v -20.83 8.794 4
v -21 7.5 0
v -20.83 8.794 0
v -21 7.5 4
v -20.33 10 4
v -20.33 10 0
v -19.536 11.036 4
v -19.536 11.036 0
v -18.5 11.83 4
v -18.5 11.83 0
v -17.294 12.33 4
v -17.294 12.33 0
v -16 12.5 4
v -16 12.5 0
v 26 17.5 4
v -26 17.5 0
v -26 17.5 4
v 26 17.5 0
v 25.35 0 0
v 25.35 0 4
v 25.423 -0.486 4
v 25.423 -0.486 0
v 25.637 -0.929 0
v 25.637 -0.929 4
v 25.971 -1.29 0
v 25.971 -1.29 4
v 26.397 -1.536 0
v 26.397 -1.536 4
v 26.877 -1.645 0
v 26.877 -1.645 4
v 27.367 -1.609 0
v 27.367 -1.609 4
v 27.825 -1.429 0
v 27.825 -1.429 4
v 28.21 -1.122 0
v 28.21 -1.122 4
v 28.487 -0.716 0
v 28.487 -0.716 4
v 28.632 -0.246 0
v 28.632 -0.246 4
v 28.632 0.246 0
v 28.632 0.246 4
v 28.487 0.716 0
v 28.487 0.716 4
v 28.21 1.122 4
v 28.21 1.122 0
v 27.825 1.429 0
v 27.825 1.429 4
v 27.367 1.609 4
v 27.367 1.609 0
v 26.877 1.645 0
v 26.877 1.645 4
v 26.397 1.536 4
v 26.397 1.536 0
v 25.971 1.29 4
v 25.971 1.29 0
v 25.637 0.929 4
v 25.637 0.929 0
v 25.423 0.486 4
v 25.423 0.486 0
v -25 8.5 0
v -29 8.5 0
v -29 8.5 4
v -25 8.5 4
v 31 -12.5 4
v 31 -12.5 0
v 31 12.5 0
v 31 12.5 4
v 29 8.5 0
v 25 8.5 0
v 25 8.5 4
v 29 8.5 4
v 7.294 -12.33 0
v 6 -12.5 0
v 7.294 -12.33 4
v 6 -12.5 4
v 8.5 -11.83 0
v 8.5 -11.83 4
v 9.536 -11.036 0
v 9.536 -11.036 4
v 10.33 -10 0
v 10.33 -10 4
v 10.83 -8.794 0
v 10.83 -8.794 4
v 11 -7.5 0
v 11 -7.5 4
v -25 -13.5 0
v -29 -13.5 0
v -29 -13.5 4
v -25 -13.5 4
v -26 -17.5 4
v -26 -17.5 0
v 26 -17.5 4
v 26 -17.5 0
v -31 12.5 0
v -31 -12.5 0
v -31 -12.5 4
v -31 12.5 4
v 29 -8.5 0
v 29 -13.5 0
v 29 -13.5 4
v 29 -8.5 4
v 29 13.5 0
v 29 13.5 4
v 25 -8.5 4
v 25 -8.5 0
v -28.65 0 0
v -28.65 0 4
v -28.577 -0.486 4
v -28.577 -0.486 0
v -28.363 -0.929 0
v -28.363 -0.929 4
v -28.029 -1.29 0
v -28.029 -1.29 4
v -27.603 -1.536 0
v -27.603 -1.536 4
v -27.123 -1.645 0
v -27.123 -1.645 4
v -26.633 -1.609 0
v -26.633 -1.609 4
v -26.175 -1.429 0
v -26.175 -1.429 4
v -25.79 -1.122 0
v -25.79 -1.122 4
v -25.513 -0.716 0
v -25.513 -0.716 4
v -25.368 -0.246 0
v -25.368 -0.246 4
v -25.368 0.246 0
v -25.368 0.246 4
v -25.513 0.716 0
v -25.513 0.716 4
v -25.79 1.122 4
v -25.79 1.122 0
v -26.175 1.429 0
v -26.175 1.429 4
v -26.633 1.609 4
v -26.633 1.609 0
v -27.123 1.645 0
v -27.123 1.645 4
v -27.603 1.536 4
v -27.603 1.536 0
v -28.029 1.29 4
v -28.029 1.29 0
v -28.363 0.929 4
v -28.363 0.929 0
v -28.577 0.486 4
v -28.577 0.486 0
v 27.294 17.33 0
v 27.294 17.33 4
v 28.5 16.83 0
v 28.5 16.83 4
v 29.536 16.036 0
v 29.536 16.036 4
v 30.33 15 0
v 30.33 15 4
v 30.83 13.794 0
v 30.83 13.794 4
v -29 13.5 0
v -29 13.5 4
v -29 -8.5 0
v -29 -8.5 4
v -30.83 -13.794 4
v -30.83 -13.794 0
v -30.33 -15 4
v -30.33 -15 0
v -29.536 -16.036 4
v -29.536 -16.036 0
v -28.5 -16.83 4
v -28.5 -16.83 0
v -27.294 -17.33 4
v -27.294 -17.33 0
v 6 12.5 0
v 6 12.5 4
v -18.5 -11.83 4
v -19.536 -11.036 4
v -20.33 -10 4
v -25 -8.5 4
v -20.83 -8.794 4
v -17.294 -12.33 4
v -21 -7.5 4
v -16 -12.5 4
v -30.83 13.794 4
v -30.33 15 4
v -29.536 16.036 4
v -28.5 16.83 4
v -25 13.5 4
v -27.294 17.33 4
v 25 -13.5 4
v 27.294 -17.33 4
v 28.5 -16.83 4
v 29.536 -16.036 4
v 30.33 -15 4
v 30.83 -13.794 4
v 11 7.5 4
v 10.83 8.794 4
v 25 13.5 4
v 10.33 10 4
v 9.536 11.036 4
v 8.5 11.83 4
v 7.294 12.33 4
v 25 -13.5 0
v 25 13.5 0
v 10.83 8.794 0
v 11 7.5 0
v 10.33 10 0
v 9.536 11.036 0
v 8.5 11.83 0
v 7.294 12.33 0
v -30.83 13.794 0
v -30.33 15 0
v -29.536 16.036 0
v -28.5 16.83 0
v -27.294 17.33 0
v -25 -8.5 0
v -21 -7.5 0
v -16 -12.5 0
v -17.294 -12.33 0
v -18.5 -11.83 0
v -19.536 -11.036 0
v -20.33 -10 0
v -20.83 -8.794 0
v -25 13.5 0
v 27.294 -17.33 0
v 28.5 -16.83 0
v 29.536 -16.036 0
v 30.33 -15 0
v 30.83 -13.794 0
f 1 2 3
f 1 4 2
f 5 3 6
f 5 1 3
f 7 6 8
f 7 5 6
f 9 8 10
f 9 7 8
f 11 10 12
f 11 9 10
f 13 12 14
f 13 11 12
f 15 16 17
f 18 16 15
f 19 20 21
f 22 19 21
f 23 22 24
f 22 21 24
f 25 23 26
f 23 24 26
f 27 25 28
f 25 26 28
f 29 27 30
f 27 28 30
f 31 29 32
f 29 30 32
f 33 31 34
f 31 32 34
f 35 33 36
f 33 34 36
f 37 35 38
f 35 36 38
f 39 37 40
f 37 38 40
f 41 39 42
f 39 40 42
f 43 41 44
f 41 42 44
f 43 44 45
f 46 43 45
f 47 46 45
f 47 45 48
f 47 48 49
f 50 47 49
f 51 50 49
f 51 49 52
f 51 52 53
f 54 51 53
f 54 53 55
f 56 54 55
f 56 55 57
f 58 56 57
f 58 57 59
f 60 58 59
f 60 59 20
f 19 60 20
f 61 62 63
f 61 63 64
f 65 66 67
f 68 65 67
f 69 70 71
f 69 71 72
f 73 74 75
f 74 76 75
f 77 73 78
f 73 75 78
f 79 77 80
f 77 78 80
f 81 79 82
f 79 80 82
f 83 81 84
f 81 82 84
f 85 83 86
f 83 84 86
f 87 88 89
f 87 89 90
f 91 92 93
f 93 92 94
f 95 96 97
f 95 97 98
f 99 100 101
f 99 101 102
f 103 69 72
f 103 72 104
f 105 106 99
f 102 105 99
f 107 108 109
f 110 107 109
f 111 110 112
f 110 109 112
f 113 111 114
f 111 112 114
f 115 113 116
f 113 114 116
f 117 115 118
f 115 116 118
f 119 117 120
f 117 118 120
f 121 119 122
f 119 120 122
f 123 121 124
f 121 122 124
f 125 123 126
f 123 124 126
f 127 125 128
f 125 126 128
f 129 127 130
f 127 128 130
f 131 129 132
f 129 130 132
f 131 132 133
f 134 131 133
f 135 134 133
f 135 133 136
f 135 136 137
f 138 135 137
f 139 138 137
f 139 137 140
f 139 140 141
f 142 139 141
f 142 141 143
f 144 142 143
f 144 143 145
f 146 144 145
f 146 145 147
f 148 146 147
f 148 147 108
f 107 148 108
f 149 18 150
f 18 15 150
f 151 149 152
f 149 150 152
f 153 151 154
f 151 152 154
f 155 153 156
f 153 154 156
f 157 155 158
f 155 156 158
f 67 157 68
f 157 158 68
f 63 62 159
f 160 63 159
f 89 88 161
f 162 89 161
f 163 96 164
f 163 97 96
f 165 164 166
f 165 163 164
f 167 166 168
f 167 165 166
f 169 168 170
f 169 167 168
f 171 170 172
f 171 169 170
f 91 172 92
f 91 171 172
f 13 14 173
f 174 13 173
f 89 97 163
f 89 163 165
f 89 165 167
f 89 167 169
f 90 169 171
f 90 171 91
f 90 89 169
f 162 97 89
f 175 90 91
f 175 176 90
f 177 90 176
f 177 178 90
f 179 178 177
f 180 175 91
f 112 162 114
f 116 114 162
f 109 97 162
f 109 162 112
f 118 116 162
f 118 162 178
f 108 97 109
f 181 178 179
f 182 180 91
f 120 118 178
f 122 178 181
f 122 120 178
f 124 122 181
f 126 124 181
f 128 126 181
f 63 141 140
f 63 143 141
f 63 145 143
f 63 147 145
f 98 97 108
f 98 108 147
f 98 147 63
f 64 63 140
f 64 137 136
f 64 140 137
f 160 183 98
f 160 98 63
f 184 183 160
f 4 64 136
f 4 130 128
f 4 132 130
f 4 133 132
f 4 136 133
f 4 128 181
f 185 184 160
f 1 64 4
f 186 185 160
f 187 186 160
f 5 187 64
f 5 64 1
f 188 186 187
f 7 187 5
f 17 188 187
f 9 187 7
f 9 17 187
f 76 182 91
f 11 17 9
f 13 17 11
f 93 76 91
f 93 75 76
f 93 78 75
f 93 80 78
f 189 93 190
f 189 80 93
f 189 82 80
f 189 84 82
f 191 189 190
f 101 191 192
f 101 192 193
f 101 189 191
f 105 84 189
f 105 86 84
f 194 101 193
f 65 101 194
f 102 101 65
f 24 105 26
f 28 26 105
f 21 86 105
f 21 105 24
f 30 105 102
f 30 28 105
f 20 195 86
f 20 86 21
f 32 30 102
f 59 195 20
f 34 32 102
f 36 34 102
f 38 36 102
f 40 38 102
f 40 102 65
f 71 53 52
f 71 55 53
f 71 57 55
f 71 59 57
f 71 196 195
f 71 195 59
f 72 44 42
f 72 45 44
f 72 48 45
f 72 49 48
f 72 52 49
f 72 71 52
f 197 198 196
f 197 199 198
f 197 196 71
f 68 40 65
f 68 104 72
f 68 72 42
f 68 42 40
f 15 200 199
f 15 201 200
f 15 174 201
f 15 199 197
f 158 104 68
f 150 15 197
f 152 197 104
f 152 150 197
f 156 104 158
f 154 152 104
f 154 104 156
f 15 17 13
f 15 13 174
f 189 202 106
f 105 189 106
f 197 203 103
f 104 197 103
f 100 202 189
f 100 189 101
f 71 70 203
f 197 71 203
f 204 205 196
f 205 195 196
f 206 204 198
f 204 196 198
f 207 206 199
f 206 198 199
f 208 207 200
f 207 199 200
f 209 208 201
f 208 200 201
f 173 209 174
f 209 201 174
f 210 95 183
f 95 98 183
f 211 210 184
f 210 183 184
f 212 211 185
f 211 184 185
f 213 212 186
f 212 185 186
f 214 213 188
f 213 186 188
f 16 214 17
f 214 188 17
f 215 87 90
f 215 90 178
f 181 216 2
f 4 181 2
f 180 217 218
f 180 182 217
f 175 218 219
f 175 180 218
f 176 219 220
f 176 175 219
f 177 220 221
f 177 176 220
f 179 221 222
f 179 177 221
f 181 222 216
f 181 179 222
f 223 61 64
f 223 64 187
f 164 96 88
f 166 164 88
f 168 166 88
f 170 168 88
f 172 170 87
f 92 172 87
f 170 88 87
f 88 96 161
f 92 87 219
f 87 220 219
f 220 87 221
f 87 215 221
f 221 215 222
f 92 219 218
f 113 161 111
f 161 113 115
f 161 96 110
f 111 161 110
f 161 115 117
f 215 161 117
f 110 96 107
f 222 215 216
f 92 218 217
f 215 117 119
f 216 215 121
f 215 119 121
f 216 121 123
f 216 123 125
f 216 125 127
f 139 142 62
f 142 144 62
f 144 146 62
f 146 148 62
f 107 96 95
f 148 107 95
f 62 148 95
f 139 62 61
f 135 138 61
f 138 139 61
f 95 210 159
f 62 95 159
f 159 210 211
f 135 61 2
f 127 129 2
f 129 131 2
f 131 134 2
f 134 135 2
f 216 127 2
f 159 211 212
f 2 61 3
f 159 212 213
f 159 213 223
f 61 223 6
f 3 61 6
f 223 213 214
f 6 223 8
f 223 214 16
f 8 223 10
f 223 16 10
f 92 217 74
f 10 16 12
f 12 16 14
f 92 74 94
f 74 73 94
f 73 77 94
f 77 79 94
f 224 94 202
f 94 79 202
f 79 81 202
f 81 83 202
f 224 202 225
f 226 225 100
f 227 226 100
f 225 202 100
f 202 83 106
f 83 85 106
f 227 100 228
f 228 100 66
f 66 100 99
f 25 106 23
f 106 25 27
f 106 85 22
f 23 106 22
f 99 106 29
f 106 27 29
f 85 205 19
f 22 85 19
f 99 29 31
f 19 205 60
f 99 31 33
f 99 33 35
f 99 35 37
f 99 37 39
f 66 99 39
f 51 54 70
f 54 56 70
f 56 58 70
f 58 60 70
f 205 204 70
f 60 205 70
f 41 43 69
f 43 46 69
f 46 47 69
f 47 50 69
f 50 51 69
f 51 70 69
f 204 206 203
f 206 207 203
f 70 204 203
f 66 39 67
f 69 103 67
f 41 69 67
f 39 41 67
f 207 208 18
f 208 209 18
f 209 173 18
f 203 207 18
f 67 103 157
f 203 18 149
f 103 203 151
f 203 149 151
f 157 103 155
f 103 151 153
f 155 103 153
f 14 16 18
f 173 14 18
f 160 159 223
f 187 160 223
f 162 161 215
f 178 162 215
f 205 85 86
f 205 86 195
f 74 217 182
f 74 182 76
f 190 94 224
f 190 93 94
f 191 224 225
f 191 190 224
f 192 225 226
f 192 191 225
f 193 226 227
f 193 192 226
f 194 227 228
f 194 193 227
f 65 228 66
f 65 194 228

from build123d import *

# Parameters (mm, degrees)
F0_W     = 62
F0_H     = 35
F0_W_2   = 4
F0_H_2   = 5
F0_W_3   = 32
F0_H_3   = 25
F1_DEPTH = 4
F2_D     = 3.3
F3_R     = 5
F4_R     = 5


with BuildPart() as f1:
    # F0 (on Top) → F1 (new body)
    with BuildSketch(Plane.XY):
        Rectangle(F0_W, F0_H)
        with Locations((-27, -11)):
            Rectangle(F0_W_2, F0_H_2, mode=Mode.SUBTRACT)
        with Locations((27, -11)):
            Rectangle(F0_W_2, F0_H_2, mode=Mode.SUBTRACT)
        with Locations((-5, 0)):
            Rectangle(F0_W_3, F0_H_3, mode=Mode.SUBTRACT)
        with Locations((-27, 11)):
            Rectangle(F0_W_2, F0_H_2, mode=Mode.SUBTRACT)
        with Locations((27, 11)):
            Rectangle(F0_W_2, F0_H_2, mode=Mode.SUBTRACT)
    extrude(amount=F1_DEPTH)

    # F2 (through all)
    with Locations(Plane(origin=(0, 0, 0), x_dir=(1, 0, 0), z_dir=(0, 0, -1))):
        with Locations((-27, 0), (27, 0)):
            Hole(F2_D / 2)

    # F3
    f3_edges = [f1.edges().sort_by_distance(p)[0] for p in [
        (-31, -17.5, 2),
        (31, -17.5, 2),
        (31, 17.5, 2),
        (-31, 17.5, 2),
    ]]
    fillet(f3_edges, radius=F3_R)

    # F4
    f4_edges = [f1.edges().sort_by_distance(p)[0] for p in [
        (-21, 12.5, 2),
        (11, 12.5, 2),
        (11, -12.5, 2),
        (-21, -12.5, 2),
    ]]
    fillet(f4_edges, radius=F4_R)


solid = f1.part
